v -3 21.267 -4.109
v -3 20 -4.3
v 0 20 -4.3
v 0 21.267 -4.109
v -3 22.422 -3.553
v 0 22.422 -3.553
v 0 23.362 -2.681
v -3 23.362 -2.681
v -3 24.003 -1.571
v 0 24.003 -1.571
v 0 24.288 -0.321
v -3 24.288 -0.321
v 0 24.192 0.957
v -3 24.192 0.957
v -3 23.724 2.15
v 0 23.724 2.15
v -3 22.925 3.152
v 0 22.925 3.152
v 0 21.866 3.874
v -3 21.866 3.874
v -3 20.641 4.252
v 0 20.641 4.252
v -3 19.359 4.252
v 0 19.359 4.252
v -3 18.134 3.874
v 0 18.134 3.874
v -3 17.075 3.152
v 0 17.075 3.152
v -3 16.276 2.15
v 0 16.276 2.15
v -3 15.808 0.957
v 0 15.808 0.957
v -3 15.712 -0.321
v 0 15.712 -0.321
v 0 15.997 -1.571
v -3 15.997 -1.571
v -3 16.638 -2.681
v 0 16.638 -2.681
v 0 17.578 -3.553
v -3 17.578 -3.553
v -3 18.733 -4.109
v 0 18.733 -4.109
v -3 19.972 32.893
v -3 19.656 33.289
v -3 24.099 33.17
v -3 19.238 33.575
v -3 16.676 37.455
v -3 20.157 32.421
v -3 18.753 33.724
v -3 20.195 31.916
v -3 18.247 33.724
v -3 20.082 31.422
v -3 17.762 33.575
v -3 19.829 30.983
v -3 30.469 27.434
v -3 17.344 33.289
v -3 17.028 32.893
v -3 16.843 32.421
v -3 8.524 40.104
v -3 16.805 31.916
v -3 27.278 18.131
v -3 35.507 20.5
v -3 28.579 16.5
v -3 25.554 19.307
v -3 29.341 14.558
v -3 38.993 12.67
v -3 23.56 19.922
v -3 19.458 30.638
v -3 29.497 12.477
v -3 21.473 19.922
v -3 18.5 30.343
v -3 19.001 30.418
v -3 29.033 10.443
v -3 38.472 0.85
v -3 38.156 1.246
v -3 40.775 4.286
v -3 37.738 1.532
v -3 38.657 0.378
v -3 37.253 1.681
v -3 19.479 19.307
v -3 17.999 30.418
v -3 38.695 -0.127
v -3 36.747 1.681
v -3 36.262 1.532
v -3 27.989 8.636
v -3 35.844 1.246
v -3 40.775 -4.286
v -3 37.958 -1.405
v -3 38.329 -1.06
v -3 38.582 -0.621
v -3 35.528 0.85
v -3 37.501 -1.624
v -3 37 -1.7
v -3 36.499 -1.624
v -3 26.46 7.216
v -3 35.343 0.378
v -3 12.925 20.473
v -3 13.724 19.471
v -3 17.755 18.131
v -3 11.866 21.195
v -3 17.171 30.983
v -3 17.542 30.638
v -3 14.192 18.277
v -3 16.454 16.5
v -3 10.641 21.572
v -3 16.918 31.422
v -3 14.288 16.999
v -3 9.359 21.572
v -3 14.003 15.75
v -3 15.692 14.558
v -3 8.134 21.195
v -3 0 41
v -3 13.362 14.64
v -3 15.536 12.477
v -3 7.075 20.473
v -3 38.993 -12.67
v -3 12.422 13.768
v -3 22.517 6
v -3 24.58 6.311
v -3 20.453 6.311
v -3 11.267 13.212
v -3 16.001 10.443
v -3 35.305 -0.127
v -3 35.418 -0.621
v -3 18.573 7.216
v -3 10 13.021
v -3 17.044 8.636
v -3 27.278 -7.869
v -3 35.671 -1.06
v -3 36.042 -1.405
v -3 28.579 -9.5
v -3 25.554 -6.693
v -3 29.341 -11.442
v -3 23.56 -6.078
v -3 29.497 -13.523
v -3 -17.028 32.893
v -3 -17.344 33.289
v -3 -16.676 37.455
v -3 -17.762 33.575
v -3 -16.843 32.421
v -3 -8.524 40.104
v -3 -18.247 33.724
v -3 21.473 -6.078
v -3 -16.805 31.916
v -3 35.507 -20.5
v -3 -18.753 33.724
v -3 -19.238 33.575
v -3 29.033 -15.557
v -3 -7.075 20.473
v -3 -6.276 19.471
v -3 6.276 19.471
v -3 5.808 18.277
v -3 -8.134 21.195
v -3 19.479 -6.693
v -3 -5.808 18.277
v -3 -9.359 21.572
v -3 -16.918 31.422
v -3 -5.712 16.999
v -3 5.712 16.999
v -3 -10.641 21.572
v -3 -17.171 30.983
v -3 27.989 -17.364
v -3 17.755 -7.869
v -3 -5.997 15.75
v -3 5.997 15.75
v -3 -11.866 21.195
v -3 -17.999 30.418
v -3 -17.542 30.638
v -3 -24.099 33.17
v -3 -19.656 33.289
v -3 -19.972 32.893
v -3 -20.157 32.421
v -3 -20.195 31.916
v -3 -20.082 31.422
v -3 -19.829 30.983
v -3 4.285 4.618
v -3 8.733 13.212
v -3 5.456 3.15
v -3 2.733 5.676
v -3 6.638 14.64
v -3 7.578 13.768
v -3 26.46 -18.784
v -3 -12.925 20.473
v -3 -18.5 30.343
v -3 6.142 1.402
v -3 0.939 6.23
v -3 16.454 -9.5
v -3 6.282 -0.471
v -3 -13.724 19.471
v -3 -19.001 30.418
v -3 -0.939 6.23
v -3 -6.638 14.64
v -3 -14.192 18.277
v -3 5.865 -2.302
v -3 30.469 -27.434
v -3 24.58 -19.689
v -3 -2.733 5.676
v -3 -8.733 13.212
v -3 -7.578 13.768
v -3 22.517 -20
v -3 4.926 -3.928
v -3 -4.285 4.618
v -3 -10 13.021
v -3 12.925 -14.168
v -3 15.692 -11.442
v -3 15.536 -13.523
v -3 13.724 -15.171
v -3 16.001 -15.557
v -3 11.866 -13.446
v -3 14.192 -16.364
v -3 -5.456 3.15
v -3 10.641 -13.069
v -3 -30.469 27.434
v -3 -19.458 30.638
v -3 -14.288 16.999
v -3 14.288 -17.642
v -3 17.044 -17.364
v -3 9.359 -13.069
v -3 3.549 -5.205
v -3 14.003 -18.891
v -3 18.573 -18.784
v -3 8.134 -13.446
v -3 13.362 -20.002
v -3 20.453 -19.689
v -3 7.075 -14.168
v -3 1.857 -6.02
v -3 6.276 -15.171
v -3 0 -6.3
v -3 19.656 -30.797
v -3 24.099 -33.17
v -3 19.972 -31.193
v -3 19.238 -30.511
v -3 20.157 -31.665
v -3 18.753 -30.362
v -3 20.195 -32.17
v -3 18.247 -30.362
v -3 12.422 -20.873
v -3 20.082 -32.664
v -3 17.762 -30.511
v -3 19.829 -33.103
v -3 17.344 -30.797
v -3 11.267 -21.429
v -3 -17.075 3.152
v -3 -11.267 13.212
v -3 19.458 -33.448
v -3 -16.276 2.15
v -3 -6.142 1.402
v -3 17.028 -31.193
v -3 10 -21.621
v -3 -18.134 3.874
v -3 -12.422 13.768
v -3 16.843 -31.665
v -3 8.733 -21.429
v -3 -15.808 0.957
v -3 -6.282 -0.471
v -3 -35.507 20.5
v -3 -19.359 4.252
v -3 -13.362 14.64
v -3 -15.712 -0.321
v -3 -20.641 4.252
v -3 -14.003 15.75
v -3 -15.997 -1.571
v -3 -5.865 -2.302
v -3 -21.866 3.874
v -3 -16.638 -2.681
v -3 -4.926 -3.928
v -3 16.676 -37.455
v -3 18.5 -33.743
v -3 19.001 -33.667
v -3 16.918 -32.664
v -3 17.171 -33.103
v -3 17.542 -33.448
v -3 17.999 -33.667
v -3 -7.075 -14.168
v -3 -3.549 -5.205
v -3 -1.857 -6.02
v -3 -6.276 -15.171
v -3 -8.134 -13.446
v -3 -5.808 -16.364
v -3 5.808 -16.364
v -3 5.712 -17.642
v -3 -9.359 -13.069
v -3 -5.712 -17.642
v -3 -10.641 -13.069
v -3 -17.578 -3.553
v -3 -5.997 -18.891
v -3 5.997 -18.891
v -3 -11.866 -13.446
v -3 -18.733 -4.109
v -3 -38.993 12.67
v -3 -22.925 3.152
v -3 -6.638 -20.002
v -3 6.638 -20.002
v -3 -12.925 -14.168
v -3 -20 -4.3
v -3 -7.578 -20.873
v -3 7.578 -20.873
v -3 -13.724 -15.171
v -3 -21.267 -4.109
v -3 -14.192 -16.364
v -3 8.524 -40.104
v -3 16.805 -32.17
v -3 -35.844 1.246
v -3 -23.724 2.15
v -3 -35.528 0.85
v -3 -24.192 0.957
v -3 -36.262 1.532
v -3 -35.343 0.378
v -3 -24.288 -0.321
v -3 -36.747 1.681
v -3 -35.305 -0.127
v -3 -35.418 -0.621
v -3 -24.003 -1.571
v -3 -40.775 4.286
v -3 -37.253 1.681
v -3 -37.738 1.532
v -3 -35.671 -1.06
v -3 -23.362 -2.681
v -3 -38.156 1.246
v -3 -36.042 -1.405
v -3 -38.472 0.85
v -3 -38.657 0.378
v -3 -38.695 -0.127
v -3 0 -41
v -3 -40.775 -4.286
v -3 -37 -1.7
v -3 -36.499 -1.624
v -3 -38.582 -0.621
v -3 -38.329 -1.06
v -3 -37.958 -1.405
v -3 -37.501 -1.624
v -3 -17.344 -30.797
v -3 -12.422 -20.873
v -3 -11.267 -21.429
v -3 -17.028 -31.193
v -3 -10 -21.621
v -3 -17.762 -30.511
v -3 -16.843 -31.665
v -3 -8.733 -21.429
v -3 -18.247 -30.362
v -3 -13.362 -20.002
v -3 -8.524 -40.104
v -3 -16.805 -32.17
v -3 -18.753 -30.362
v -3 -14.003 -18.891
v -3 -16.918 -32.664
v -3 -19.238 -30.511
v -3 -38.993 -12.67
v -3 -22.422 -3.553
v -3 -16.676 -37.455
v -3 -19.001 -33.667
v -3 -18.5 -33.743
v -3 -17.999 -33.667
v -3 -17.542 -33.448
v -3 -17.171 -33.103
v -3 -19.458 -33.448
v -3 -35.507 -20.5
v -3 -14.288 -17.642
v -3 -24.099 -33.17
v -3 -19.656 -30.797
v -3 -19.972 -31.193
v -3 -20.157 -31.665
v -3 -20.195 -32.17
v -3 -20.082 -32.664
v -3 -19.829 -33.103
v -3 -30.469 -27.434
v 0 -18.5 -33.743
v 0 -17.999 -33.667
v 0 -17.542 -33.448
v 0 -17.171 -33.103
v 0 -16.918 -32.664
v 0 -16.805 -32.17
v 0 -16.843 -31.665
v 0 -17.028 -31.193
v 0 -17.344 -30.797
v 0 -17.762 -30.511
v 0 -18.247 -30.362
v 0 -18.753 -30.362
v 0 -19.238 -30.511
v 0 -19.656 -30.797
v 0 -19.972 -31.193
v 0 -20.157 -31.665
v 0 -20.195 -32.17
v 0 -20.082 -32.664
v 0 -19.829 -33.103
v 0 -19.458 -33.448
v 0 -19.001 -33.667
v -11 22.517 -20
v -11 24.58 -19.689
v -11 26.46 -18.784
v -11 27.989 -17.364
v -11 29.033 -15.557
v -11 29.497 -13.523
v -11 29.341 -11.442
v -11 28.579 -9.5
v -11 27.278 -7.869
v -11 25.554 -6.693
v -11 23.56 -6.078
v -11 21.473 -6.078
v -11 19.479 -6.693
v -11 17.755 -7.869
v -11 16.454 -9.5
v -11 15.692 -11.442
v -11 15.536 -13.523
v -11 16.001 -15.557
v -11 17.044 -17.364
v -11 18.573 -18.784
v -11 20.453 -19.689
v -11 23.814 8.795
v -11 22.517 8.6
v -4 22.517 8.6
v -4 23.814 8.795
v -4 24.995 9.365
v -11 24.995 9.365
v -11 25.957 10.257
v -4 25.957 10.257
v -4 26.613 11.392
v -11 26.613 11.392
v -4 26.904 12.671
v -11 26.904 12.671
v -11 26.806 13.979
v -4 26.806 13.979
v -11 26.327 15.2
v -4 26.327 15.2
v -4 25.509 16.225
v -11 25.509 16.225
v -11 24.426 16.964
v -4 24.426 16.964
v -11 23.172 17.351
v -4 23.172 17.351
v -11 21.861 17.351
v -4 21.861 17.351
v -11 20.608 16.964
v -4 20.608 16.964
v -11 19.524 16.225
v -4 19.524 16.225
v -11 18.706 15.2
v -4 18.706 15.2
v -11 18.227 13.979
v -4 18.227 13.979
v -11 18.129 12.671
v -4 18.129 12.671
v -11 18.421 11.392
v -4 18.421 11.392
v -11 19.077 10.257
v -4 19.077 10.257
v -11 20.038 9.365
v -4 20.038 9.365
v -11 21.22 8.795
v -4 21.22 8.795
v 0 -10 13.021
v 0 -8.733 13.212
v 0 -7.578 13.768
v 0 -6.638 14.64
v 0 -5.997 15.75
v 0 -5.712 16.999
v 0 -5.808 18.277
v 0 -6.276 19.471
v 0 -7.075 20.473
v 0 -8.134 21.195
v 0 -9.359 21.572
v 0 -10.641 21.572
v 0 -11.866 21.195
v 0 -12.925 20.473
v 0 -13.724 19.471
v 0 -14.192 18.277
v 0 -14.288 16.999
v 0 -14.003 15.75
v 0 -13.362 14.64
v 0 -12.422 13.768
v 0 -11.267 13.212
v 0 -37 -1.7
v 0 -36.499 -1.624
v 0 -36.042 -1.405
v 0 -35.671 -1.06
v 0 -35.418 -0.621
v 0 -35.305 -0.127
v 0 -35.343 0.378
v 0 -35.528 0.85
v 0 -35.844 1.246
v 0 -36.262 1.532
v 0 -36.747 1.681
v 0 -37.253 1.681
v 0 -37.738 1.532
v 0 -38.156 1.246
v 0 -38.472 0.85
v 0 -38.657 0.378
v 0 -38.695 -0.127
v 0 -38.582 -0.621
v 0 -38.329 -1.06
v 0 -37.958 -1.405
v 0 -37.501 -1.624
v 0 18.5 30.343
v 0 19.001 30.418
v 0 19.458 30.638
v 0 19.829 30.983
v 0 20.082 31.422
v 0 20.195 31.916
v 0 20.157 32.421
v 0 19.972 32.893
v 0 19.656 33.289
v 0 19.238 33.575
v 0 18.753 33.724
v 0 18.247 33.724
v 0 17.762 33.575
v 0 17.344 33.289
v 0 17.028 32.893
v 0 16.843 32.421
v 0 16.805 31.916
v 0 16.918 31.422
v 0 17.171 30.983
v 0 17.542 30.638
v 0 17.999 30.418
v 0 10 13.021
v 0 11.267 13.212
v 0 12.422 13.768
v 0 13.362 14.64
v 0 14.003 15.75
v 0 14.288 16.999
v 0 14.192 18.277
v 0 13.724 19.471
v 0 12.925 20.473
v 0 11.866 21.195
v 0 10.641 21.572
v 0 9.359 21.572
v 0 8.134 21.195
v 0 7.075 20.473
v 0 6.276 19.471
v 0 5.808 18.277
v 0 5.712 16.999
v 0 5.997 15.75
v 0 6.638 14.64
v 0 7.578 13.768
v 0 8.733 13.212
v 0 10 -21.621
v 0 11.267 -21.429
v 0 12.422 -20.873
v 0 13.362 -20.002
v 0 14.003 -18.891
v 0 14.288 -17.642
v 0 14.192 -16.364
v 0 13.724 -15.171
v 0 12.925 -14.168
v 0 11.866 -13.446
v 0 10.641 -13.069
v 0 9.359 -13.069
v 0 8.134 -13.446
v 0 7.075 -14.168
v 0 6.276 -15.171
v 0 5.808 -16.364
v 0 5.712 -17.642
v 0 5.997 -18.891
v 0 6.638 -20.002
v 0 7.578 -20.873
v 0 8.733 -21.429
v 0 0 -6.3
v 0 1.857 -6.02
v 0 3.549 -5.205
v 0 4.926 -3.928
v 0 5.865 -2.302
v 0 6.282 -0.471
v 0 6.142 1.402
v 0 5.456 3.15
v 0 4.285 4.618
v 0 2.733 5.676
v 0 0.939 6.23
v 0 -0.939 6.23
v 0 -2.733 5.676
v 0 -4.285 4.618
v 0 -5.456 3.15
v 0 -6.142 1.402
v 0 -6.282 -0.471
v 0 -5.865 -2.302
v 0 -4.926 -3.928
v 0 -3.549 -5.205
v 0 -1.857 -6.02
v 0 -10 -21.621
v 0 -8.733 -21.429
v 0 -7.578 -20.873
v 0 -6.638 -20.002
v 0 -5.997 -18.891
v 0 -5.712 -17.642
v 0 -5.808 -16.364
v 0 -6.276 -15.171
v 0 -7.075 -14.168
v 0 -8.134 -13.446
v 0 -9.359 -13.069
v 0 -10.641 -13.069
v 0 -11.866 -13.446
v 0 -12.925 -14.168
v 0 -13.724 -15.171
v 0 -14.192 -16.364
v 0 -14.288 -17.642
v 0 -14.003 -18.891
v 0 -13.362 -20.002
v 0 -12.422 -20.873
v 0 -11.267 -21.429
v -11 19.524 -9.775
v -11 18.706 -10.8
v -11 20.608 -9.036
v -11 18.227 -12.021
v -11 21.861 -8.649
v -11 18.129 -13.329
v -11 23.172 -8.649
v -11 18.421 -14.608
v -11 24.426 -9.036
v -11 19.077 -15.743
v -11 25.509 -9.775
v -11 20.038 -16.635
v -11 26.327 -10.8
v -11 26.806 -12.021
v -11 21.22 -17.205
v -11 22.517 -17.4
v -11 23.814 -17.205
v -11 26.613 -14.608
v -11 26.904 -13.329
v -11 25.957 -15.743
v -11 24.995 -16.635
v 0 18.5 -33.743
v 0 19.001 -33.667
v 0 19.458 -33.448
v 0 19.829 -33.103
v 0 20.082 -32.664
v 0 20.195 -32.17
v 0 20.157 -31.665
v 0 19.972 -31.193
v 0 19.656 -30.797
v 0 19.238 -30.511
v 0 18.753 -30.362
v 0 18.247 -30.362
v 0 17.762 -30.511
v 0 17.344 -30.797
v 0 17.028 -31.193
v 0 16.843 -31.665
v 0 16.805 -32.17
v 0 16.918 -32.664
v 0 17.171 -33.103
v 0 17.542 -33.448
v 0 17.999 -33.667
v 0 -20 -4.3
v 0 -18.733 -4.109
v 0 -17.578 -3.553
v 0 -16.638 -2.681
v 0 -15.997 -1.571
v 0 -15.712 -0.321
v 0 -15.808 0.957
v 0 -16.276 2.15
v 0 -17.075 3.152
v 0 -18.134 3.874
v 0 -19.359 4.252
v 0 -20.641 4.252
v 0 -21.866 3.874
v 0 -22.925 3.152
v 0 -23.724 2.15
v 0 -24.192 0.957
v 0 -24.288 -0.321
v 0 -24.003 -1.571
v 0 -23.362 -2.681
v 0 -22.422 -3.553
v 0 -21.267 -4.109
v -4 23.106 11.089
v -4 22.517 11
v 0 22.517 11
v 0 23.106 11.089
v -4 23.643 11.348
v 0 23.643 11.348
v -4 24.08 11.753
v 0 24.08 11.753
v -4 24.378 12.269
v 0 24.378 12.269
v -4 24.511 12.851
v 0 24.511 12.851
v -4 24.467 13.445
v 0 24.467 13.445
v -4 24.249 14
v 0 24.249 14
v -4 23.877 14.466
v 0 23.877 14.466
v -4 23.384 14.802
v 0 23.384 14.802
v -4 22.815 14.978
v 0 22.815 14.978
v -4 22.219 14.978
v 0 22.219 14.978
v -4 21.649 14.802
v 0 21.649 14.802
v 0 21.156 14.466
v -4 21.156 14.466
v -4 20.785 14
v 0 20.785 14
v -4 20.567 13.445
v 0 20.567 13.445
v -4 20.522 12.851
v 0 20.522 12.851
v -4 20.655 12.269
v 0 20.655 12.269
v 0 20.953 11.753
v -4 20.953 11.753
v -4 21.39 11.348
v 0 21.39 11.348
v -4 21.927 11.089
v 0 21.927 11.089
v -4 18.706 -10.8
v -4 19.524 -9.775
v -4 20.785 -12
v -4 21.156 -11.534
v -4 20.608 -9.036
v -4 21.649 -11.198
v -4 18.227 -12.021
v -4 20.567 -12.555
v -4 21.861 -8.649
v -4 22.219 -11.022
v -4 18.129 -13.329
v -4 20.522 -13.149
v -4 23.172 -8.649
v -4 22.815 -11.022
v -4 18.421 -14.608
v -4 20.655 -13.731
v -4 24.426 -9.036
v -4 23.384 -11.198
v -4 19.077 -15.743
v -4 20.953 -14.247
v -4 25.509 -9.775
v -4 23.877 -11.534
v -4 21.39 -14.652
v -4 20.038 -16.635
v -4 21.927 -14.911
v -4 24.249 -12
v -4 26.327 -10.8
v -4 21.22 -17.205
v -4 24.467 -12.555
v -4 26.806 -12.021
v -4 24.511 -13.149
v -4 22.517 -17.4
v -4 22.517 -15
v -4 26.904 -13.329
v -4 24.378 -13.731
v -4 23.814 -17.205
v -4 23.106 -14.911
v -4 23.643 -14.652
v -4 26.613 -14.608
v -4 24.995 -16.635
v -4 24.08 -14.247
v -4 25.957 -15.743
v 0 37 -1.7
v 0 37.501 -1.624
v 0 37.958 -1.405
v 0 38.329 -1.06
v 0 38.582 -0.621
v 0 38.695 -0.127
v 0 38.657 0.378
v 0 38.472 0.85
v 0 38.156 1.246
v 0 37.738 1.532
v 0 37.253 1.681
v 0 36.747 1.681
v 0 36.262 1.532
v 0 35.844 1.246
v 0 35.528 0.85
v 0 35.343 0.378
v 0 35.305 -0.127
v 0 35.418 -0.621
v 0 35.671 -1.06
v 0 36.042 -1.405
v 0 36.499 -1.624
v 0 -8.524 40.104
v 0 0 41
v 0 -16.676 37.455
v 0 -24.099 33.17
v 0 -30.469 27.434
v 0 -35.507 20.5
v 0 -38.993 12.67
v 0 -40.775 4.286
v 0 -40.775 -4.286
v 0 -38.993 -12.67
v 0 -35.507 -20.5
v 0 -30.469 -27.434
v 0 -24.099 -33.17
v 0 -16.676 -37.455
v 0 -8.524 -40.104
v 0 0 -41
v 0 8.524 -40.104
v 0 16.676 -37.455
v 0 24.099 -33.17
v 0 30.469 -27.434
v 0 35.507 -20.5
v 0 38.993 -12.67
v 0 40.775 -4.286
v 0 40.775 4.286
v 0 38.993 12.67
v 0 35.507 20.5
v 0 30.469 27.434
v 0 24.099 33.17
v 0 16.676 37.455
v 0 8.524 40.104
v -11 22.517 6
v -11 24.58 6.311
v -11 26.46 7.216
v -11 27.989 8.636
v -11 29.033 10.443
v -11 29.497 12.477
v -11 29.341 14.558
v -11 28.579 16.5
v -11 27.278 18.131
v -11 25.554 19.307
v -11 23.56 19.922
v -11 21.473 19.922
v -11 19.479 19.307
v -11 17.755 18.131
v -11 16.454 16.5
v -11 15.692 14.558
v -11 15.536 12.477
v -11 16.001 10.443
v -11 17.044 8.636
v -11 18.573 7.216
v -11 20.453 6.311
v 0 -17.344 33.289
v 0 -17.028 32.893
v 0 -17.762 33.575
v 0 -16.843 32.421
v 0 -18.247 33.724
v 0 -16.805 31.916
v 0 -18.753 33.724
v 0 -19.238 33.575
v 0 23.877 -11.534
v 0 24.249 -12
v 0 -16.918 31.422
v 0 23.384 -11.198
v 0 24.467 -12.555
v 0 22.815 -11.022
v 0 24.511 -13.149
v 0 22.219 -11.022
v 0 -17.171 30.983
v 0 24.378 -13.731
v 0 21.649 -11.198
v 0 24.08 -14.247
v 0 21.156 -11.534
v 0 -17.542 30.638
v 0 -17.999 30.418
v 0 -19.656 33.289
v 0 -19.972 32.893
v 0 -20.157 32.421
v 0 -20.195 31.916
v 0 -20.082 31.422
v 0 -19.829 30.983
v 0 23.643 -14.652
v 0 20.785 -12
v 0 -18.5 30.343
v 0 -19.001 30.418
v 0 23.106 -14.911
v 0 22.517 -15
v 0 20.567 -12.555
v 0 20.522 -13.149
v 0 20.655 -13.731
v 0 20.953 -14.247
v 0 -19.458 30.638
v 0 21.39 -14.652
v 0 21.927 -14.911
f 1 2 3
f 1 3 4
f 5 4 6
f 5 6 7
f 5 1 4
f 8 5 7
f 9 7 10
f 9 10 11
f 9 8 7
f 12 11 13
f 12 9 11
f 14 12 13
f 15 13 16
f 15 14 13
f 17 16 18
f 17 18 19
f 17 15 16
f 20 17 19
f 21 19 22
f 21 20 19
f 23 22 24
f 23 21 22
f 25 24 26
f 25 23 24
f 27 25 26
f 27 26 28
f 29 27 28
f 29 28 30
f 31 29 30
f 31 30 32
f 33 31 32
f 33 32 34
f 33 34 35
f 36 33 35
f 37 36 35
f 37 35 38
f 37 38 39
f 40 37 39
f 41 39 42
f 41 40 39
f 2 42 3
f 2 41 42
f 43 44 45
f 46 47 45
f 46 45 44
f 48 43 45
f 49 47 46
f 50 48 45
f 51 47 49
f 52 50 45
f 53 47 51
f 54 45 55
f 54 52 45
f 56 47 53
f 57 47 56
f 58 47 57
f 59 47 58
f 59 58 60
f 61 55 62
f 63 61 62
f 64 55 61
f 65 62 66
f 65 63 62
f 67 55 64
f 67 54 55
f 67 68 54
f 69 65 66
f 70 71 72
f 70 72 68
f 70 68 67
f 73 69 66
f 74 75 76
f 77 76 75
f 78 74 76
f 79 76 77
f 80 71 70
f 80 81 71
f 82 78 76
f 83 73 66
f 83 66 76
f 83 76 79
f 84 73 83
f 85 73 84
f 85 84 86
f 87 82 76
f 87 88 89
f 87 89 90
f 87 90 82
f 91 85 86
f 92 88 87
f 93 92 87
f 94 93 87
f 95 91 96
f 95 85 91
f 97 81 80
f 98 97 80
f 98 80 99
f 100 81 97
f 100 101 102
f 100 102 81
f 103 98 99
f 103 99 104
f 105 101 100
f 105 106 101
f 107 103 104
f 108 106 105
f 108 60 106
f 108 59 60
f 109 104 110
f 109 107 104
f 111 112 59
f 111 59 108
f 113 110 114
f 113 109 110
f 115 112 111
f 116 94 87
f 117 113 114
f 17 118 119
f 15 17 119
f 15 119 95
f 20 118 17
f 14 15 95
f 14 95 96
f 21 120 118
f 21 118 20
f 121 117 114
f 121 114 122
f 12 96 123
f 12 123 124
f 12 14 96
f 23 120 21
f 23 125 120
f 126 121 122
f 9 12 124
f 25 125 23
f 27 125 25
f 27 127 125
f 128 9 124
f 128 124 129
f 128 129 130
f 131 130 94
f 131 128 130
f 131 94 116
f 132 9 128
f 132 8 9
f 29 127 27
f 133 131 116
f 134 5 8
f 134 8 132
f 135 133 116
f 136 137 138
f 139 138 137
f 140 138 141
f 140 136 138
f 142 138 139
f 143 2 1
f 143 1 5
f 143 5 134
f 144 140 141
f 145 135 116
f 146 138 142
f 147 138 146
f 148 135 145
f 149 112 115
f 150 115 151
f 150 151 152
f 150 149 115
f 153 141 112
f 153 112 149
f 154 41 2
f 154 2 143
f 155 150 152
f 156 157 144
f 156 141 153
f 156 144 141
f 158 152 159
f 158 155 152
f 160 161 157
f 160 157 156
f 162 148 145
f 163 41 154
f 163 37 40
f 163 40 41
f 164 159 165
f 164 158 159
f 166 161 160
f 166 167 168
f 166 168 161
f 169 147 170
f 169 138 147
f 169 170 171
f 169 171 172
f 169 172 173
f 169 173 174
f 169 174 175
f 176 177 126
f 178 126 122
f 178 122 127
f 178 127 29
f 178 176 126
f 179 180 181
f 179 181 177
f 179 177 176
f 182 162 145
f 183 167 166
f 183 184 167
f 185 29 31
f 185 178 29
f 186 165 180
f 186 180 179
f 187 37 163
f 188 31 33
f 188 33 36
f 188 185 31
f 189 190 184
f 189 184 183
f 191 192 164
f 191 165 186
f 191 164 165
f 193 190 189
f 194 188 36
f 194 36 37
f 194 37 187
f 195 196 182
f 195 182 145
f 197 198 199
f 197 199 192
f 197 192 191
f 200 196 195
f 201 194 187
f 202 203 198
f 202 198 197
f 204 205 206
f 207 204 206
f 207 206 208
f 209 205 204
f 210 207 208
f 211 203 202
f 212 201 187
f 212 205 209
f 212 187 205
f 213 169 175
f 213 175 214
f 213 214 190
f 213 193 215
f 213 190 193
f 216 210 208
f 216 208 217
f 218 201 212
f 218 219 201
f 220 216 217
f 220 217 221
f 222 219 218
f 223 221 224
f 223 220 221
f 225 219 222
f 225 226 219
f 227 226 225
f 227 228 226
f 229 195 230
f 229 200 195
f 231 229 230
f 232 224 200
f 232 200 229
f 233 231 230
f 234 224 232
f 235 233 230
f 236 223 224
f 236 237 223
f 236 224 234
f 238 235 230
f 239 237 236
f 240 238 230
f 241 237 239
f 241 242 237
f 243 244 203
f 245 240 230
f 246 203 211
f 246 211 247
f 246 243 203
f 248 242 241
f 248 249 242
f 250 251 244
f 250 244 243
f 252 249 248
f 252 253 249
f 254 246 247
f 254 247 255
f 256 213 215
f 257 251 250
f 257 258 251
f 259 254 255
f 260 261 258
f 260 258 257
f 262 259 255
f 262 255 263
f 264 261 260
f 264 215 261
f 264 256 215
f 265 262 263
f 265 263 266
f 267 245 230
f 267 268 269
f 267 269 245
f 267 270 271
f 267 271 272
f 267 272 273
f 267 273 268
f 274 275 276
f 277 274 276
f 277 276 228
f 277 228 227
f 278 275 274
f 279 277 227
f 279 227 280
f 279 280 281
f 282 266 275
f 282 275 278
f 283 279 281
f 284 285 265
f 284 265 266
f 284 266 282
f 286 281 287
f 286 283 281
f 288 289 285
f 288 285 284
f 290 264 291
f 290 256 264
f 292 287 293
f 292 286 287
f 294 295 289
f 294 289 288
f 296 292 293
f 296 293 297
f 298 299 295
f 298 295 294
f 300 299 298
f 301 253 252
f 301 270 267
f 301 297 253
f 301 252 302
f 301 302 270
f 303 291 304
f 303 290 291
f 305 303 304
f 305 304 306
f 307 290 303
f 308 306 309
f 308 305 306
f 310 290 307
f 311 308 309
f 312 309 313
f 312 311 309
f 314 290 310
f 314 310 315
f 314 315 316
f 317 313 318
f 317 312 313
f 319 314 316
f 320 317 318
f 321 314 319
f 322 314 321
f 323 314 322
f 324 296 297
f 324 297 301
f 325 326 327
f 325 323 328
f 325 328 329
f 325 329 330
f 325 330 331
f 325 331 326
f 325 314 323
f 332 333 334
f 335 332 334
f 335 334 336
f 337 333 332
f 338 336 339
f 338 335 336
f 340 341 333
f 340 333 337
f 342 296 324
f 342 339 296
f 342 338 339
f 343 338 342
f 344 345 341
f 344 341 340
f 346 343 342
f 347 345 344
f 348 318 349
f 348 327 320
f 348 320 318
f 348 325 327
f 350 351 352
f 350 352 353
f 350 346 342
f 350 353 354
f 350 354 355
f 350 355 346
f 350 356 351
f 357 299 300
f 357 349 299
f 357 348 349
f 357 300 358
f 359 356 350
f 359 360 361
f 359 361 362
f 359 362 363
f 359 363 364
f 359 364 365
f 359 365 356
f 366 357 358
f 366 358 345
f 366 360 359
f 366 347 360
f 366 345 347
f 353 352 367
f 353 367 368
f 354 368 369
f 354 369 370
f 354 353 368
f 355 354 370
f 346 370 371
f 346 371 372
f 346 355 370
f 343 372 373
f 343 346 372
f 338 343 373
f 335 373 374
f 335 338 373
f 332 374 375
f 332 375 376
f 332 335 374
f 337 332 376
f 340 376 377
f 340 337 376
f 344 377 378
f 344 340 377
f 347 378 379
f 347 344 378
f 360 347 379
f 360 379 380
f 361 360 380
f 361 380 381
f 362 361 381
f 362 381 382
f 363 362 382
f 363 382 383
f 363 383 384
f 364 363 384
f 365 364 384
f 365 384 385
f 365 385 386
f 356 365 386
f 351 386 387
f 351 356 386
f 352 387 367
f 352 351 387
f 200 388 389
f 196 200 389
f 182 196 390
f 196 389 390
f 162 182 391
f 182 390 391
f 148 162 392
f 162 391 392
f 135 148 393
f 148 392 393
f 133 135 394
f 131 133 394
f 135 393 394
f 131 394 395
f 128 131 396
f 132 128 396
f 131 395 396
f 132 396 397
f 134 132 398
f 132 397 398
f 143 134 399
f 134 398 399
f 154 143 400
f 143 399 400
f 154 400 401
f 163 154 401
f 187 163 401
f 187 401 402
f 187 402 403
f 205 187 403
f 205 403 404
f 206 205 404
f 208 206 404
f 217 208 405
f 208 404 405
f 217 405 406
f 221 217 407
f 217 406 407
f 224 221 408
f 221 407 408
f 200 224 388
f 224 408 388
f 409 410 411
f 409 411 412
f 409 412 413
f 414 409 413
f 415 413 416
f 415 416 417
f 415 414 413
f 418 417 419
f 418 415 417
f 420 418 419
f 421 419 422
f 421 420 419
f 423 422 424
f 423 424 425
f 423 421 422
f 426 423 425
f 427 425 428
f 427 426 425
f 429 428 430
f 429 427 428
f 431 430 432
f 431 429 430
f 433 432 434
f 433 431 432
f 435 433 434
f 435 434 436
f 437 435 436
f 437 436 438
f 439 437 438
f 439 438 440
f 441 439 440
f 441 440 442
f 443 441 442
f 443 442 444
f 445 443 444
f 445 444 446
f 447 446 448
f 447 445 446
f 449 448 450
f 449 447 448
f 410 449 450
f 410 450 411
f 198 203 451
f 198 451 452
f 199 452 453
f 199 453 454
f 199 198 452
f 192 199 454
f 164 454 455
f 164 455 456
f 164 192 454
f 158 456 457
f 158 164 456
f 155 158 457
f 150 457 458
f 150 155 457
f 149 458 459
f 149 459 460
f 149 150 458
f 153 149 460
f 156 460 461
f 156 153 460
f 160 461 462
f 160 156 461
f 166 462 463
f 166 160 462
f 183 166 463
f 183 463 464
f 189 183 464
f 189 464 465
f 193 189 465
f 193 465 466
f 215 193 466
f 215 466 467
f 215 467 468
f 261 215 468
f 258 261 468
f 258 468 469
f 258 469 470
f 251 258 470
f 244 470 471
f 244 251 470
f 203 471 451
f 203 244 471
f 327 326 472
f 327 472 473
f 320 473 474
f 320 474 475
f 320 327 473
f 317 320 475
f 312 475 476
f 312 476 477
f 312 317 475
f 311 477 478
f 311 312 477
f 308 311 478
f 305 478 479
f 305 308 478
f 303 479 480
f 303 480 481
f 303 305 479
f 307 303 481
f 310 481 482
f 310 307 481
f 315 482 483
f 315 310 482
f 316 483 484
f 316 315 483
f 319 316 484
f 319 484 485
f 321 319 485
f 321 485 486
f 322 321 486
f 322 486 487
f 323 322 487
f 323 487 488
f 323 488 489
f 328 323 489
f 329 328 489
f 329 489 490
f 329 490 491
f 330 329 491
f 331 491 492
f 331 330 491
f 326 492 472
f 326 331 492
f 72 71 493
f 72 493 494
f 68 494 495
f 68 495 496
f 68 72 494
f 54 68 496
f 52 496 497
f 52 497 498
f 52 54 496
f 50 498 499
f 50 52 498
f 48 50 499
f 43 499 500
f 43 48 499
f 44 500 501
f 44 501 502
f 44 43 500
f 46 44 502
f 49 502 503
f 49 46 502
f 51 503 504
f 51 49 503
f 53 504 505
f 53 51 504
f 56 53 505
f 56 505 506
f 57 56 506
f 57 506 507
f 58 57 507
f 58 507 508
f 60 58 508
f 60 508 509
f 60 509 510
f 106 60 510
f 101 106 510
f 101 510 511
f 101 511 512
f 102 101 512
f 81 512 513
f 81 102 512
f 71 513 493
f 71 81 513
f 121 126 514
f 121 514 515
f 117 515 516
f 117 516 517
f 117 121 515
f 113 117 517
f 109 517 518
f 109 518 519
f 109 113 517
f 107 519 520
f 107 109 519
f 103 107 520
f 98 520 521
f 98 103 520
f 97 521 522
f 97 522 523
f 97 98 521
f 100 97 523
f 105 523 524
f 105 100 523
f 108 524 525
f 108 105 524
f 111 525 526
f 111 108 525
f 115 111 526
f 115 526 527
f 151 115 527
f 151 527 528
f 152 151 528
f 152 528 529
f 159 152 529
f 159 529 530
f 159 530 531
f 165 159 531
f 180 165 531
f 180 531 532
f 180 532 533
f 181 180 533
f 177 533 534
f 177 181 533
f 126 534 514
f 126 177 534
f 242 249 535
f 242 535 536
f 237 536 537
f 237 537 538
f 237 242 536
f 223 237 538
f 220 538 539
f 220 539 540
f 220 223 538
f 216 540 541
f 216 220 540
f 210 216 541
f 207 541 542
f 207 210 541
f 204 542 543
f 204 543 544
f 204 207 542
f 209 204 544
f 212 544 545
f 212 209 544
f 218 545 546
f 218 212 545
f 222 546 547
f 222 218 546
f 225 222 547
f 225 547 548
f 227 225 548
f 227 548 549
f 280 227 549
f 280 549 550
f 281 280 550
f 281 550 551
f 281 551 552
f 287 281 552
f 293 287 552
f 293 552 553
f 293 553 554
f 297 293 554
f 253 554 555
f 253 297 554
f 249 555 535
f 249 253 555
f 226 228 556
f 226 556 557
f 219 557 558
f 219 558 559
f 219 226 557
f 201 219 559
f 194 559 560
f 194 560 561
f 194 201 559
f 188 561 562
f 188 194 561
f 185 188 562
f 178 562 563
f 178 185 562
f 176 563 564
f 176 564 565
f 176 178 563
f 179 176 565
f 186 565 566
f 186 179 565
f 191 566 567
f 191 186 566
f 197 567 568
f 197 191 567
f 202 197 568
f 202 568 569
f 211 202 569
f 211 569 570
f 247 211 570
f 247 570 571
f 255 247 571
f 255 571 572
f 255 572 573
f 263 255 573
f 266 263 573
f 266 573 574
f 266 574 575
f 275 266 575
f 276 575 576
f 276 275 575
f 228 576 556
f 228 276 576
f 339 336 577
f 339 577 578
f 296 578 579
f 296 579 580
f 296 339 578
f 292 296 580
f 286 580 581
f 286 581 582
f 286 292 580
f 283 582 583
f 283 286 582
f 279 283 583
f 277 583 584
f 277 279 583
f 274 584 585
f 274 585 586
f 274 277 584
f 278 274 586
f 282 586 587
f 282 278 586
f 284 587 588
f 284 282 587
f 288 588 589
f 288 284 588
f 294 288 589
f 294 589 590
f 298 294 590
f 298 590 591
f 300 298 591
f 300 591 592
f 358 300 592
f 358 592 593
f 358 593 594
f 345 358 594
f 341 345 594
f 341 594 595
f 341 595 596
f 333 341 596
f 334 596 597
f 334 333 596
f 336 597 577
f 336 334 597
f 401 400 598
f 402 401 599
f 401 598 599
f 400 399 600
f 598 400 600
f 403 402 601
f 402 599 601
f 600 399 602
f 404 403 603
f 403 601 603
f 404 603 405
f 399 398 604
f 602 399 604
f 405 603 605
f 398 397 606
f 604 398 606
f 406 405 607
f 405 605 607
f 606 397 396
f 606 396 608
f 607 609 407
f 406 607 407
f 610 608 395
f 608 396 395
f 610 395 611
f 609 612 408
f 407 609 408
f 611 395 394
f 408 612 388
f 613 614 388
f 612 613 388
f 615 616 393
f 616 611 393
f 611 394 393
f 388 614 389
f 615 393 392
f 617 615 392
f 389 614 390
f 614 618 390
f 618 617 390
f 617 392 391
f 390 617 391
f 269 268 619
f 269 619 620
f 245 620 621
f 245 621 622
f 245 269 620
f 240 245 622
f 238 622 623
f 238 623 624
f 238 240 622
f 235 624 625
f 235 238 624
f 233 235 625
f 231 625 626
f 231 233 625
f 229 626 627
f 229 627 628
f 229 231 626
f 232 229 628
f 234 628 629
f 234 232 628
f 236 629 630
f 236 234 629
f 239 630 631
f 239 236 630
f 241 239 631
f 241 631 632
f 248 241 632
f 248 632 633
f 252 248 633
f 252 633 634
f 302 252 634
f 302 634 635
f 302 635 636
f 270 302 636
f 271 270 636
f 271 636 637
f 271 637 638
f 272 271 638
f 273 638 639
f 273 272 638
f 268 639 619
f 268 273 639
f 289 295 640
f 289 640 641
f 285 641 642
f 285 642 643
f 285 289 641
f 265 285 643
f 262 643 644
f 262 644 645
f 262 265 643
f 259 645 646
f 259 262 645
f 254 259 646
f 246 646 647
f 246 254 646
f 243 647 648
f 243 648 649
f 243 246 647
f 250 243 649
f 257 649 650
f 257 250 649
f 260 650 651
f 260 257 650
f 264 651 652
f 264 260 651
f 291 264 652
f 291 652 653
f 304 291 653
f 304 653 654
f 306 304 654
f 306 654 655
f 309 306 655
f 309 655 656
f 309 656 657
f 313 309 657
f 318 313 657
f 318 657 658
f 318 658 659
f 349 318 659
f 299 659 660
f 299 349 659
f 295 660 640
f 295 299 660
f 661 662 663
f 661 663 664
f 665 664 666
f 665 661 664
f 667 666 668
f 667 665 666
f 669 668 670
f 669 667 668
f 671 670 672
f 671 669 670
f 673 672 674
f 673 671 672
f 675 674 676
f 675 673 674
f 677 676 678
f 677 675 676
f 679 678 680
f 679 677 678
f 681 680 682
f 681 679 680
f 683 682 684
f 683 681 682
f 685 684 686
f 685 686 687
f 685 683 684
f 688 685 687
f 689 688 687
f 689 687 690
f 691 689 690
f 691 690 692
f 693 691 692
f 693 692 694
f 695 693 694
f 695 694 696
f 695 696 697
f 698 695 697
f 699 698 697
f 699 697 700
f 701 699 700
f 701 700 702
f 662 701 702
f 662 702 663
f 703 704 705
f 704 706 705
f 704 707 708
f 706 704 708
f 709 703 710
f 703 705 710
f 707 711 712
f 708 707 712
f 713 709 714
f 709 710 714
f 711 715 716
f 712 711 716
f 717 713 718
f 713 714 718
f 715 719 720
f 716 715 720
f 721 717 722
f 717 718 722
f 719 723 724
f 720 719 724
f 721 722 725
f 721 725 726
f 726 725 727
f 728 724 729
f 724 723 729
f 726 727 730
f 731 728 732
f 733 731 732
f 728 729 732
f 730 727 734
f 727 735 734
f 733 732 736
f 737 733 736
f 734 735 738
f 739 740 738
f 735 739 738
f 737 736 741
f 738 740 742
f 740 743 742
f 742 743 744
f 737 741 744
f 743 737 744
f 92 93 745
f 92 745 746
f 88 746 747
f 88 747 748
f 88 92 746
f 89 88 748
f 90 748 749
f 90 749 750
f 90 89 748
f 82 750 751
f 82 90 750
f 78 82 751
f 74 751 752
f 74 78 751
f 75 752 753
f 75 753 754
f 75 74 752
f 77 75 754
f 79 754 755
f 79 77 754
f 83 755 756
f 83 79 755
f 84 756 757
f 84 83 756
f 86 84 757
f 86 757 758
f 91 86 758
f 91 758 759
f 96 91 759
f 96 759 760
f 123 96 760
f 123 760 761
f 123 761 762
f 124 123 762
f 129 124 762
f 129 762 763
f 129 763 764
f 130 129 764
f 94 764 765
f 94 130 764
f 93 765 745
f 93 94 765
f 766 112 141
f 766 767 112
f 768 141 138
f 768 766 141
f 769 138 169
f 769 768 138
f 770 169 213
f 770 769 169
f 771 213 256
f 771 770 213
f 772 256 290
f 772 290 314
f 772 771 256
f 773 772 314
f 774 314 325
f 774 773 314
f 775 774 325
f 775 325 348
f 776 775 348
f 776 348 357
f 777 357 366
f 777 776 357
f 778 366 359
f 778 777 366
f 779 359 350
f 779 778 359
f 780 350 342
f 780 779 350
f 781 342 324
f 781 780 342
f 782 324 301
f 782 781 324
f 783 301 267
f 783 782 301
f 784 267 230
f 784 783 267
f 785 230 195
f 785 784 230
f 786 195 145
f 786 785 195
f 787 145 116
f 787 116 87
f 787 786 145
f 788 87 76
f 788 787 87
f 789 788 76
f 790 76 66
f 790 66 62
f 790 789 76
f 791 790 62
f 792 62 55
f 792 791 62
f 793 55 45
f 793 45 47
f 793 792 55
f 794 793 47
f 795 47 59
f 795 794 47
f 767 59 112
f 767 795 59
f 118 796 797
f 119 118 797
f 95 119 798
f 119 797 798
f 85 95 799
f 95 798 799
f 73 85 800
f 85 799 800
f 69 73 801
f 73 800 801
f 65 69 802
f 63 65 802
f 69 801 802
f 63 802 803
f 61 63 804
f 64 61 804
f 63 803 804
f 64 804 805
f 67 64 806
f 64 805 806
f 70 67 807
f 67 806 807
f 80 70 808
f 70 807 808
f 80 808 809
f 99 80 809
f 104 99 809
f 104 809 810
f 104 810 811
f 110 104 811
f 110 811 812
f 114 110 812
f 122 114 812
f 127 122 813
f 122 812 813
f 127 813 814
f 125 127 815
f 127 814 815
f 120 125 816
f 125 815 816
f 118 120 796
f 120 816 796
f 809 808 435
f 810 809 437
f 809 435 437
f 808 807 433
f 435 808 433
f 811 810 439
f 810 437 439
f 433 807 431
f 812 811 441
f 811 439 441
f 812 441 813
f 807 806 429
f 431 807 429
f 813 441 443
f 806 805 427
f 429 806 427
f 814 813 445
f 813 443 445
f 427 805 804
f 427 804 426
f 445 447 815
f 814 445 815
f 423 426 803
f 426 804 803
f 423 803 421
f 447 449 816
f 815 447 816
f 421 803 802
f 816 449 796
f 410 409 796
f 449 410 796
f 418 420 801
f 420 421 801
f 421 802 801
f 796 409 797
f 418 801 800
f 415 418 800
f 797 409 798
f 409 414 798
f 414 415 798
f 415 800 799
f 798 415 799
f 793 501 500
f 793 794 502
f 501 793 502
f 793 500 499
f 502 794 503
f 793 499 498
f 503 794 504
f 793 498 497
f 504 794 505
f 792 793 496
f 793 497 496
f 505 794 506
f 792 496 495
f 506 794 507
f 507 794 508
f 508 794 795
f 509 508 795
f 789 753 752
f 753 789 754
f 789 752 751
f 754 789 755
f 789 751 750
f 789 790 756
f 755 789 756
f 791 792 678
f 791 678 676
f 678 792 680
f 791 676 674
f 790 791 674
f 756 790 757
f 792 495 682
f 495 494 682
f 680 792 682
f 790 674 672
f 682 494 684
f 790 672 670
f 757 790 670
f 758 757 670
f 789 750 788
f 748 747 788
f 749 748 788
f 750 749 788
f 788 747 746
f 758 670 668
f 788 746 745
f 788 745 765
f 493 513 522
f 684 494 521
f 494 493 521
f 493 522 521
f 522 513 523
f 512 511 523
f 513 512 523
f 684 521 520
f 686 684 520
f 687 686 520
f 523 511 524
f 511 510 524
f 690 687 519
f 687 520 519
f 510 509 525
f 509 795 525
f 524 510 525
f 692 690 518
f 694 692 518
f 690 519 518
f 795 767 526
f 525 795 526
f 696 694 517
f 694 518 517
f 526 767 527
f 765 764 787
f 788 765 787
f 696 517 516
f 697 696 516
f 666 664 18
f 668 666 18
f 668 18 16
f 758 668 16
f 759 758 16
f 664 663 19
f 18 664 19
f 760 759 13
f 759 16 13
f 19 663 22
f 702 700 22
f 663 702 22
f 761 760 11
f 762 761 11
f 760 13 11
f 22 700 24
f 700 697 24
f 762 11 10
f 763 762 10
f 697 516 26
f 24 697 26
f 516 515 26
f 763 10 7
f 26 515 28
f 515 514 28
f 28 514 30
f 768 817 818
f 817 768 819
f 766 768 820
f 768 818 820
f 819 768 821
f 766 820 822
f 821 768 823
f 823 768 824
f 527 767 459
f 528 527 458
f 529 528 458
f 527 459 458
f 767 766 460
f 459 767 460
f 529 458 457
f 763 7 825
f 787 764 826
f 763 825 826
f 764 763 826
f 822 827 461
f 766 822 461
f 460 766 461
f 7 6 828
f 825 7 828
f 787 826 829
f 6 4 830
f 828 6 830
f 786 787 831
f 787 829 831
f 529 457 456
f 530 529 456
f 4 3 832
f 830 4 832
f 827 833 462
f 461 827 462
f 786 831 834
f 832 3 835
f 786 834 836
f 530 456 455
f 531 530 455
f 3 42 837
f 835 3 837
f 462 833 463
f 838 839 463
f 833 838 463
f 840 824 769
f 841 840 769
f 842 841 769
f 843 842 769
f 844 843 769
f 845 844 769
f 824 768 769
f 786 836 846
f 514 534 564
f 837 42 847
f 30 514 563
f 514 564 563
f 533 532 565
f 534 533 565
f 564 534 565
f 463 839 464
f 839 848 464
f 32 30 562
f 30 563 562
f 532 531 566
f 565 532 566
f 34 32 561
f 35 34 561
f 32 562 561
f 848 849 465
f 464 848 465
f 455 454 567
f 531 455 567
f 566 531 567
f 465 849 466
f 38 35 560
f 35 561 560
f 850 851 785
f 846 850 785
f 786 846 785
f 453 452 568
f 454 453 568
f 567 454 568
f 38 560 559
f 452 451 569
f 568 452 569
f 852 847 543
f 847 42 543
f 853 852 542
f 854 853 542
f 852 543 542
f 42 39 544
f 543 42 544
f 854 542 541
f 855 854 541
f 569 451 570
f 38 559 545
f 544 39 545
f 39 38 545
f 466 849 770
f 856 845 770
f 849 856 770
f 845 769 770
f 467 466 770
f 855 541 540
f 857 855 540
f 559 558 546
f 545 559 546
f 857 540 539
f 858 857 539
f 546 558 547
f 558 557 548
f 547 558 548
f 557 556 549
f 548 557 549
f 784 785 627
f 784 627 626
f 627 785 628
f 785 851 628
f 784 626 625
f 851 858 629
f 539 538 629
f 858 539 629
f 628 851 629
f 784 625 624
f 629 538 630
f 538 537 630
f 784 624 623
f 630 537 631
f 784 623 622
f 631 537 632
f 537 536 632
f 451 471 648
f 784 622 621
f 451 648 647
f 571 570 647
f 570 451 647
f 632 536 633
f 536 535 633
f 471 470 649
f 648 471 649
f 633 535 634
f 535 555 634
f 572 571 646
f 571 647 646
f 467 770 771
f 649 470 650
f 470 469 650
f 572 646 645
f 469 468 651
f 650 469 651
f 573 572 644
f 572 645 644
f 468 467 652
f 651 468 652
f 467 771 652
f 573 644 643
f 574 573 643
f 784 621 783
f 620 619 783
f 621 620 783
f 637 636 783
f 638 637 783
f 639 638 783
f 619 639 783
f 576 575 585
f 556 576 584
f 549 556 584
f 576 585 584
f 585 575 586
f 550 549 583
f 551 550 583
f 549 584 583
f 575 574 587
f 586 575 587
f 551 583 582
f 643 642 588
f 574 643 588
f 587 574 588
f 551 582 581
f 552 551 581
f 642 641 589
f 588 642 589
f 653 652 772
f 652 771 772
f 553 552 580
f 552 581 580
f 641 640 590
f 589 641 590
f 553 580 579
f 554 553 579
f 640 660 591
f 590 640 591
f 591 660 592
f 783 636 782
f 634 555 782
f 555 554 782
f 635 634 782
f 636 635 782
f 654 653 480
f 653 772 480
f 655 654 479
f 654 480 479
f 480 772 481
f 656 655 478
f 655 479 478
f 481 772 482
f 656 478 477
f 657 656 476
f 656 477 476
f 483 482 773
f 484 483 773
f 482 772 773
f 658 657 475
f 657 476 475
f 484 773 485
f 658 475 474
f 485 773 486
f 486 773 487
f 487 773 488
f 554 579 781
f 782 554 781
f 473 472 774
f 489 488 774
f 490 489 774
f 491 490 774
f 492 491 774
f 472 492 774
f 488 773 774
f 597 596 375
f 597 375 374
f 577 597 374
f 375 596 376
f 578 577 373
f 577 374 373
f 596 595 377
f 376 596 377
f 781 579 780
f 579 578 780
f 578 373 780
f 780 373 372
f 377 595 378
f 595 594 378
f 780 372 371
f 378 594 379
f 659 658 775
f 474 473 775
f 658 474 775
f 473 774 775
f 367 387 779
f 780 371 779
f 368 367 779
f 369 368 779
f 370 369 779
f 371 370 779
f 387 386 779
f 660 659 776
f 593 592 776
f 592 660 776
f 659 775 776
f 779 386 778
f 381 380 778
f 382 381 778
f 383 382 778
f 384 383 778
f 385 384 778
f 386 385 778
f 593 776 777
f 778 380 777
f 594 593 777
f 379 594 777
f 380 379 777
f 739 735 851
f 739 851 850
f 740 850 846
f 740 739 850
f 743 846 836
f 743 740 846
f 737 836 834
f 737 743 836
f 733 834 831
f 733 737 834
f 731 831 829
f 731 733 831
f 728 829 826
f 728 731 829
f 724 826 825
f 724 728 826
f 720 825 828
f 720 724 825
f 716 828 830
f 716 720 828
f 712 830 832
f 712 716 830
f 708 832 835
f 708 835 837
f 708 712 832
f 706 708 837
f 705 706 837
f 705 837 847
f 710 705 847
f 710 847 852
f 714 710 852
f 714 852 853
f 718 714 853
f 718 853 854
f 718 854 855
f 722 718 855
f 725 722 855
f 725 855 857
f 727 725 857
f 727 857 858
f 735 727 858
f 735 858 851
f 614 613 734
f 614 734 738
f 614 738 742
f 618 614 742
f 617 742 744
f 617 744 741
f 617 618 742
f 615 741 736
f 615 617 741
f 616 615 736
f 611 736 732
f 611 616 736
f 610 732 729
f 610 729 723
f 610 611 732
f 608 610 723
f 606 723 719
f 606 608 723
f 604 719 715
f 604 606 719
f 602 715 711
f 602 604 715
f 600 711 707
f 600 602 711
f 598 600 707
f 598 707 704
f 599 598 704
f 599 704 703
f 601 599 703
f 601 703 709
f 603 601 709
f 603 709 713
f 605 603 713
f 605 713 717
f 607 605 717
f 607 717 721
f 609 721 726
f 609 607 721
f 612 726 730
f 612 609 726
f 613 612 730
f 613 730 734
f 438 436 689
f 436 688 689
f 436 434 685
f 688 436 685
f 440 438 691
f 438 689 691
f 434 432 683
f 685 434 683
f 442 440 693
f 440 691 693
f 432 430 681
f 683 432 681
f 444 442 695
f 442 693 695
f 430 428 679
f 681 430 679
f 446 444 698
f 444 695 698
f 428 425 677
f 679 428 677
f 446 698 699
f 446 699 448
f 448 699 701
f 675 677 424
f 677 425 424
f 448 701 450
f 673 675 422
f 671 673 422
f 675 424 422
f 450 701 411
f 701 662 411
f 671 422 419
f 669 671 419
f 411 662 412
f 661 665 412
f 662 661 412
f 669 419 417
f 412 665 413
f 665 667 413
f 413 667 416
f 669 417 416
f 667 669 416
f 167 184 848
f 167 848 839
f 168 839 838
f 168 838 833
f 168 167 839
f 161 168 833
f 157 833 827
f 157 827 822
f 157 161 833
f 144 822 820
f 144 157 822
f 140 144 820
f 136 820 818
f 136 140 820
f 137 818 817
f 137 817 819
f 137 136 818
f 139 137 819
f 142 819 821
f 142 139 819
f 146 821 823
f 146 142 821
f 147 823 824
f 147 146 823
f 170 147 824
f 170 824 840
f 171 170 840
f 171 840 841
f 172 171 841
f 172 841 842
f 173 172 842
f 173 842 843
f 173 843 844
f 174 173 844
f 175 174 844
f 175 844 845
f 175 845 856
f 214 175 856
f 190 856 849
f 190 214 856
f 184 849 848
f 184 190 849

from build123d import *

# Parameters (mm, degrees)
AXIAL_BLANK_PROFILE_W                          = 3
AXIAL_BLANK_PROFILE_H                          = 41
RELOCATED_START                                = -11
RELOCATED_INTEGRAL_PORT_BOSSES_BETWE_2_R       = 7
RELOCATED_INTEGRAL_PORT_BOSSES_BETWEEN_M_DEPTH = 8
SEVEN_START                                    = -3
SEVEN_DRY_MAGNET_PASSAGES_THROUGH_CO_2_R       = 6.3
SEVEN_DRY_MAGNET_PASSAGES_THROUGH_CO_2_R_2     = 4.3
SEVEN_DRY_MAGNET_PASSAGES_THROUGH_COVER_DEPTH  = 3
SIX_START                                      = -3
SIX_COVER_CLEARANCE_HOLES_PCD74_SKETCH_R       = 1.7
SIX_COVER_CLEARANCE_HOLES_PCD74_DEPTH          = 3
G1_8_START                                     = -11
G1_8_TAPPING_PILOT_ENVELOPES_DEPTH7_SKET_R     = 4.4
G1_8_TAPPING_PILOT_ENVELOPES_DEPTH7_DEPTH      = 7
WATER_START                                    = -11
WATER_PORTS_DIAMETER4_INTO_COOLANT_P_2_R       = 2
WATER_PORTS_DIAMETER4_INTO_COOLANT_PLENU_DEPTH = 11


with BuildPart() as part:
    # Axial blank profile → Native revolved blank (revolve)
    with BuildSketch(Plane.XY, mode=Mode.PRIVATE) as native_revolved_blank_sk:
        with Locations((-1.5, 20.5)):
            Rectangle(AXIAL_BLANK_PROFILE_W, AXIAL_BLANK_PROFILE_H)
    revolve(native_revolved_blank_sk.sketch.rotate(Axis((-60, 0, 0), (1, 0, 0)), 90), axis=Axis((-60, 0, 0), (1, 0, 0)))

    # Relocated integral port bosses betwe 2 → Relocated integral port bosses between m (add)
    with BuildSketch(Plane(origin=(0, 0, 0), x_dir=(0, 0, -1), z_dir=(1, 0, 0)).offset(RELOCATED_START)):
        with Locations((-13, 22.516660498)):
            Circle(RELOCATED_INTEGRAL_PORT_BOSSES_BETWE_2_R)
        with Locations((13, 22.516660498)):
            Circle(RELOCATED_INTEGRAL_PORT_BOSSES_BETWE_2_R)
    extrude(amount=RELOCATED_INTEGRAL_PORT_BOSSES_BETWEEN_M_DEPTH)

    # Seven dry magnet passages through co 2 → Seven dry magnet passages through cover (cut)
    with BuildSketch(Plane(origin=(0, 0, 0), x_dir=(0, 0, -1), z_dir=(1, 0, 0)).offset(SEVEN_START)):
        Circle(SEVEN_DRY_MAGNET_PASSAGES_THROUGH_CO_2_R)
        with Locations((0, 20)):
            Circle(SEVEN_DRY_MAGNET_PASSAGES_THROUGH_CO_2_R_2)
        with Locations((-17.320508076, 10)):
            Circle(SEVEN_DRY_MAGNET_PASSAGES_THROUGH_CO_2_R_2)
        with Locations((-17.320508076, -10)):
            Circle(SEVEN_DRY_MAGNET_PASSAGES_THROUGH_CO_2_R_2)
        with Locations((0, -20)):
            Circle(SEVEN_DRY_MAGNET_PASSAGES_THROUGH_CO_2_R_2)
        with Locations((17.320508076, -10)):
            Circle(SEVEN_DRY_MAGNET_PASSAGES_THROUGH_CO_2_R_2)
        with Locations((17.320508076, 10)):
            Circle(SEVEN_DRY_MAGNET_PASSAGES_THROUGH_CO_2_R_2)
    extrude(amount=SEVEN_DRY_MAGNET_PASSAGES_THROUGH_COVER_DEPTH, mode=Mode.SUBTRACT)

    # Six cover clearance holes PCD74 sketch → Six cover clearance holes PCD74 (cut)
    with BuildSketch(Plane(origin=(0, 0, 0), x_dir=(0, 0, -1), z_dir=(1, 0, 0)).offset(SIX_START)):
        with Locations((0, 37)):
            Circle(SIX_COVER_CLEARANCE_HOLES_PCD74_SKETCH_R)
        with Locations((-32.04293994, 18.5)):
            Circle(SIX_COVER_CLEARANCE_HOLES_PCD74_SKETCH_R)
        with Locations((-32.04293994, -18.5)):
            Circle(SIX_COVER_CLEARANCE_HOLES_PCD74_SKETCH_R)
        with Locations((0, -37)):
            Circle(SIX_COVER_CLEARANCE_HOLES_PCD74_SKETCH_R)
        with Locations((32.04293994, -18.5)):
            Circle(SIX_COVER_CLEARANCE_HOLES_PCD74_SKETCH_R)
        with Locations((32.04293994, 18.5)):
            Circle(SIX_COVER_CLEARANCE_HOLES_PCD74_SKETCH_R)
    extrude(amount=SIX_COVER_CLEARANCE_HOLES_PCD74_DEPTH, mode=Mode.SUBTRACT)

    # G1-8 tapping pilot envelopes depth7 sketch → G1-8 tapping pilot envelopes depth7 (cut)
    with BuildSketch(Plane(origin=(0, 0, 0), x_dir=(0, 0, -1), z_dir=(1, 0, 0)).offset(G1_8_START)):
        with Locations((-13, 22.516660498)):
            Circle(G1_8_TAPPING_PILOT_ENVELOPES_DEPTH7_SKET_R)
        with Locations((13, 22.516660498)):
            Circle(G1_8_TAPPING_PILOT_ENVELOPES_DEPTH7_SKET_R)
    extrude(amount=G1_8_TAPPING_PILOT_ENVELOPES_DEPTH7_DEPTH, mode=Mode.SUBTRACT)

    # Water ports diameter4 into coolant p 2 → Water ports diameter4 into coolant plenu (cut)
    with BuildSketch(Plane(origin=(0, 0, 0), x_dir=(0, 0, -1), z_dir=(1, 0, 0)).offset(WATER_START)):
        with Locations((-13, 22.516660498)):
            Circle(WATER_PORTS_DIAMETER4_INTO_COOLANT_P_2_R)
        with Locations((13, 22.516660498)):
            Circle(WATER_PORTS_DIAMETER4_INTO_COOLANT_P_2_R)
    extrude(amount=WATER_PORTS_DIAMETER4_INTO_COOLANT_PLENU_DEPTH, mode=Mode.SUBTRACT)


solid = part.part
